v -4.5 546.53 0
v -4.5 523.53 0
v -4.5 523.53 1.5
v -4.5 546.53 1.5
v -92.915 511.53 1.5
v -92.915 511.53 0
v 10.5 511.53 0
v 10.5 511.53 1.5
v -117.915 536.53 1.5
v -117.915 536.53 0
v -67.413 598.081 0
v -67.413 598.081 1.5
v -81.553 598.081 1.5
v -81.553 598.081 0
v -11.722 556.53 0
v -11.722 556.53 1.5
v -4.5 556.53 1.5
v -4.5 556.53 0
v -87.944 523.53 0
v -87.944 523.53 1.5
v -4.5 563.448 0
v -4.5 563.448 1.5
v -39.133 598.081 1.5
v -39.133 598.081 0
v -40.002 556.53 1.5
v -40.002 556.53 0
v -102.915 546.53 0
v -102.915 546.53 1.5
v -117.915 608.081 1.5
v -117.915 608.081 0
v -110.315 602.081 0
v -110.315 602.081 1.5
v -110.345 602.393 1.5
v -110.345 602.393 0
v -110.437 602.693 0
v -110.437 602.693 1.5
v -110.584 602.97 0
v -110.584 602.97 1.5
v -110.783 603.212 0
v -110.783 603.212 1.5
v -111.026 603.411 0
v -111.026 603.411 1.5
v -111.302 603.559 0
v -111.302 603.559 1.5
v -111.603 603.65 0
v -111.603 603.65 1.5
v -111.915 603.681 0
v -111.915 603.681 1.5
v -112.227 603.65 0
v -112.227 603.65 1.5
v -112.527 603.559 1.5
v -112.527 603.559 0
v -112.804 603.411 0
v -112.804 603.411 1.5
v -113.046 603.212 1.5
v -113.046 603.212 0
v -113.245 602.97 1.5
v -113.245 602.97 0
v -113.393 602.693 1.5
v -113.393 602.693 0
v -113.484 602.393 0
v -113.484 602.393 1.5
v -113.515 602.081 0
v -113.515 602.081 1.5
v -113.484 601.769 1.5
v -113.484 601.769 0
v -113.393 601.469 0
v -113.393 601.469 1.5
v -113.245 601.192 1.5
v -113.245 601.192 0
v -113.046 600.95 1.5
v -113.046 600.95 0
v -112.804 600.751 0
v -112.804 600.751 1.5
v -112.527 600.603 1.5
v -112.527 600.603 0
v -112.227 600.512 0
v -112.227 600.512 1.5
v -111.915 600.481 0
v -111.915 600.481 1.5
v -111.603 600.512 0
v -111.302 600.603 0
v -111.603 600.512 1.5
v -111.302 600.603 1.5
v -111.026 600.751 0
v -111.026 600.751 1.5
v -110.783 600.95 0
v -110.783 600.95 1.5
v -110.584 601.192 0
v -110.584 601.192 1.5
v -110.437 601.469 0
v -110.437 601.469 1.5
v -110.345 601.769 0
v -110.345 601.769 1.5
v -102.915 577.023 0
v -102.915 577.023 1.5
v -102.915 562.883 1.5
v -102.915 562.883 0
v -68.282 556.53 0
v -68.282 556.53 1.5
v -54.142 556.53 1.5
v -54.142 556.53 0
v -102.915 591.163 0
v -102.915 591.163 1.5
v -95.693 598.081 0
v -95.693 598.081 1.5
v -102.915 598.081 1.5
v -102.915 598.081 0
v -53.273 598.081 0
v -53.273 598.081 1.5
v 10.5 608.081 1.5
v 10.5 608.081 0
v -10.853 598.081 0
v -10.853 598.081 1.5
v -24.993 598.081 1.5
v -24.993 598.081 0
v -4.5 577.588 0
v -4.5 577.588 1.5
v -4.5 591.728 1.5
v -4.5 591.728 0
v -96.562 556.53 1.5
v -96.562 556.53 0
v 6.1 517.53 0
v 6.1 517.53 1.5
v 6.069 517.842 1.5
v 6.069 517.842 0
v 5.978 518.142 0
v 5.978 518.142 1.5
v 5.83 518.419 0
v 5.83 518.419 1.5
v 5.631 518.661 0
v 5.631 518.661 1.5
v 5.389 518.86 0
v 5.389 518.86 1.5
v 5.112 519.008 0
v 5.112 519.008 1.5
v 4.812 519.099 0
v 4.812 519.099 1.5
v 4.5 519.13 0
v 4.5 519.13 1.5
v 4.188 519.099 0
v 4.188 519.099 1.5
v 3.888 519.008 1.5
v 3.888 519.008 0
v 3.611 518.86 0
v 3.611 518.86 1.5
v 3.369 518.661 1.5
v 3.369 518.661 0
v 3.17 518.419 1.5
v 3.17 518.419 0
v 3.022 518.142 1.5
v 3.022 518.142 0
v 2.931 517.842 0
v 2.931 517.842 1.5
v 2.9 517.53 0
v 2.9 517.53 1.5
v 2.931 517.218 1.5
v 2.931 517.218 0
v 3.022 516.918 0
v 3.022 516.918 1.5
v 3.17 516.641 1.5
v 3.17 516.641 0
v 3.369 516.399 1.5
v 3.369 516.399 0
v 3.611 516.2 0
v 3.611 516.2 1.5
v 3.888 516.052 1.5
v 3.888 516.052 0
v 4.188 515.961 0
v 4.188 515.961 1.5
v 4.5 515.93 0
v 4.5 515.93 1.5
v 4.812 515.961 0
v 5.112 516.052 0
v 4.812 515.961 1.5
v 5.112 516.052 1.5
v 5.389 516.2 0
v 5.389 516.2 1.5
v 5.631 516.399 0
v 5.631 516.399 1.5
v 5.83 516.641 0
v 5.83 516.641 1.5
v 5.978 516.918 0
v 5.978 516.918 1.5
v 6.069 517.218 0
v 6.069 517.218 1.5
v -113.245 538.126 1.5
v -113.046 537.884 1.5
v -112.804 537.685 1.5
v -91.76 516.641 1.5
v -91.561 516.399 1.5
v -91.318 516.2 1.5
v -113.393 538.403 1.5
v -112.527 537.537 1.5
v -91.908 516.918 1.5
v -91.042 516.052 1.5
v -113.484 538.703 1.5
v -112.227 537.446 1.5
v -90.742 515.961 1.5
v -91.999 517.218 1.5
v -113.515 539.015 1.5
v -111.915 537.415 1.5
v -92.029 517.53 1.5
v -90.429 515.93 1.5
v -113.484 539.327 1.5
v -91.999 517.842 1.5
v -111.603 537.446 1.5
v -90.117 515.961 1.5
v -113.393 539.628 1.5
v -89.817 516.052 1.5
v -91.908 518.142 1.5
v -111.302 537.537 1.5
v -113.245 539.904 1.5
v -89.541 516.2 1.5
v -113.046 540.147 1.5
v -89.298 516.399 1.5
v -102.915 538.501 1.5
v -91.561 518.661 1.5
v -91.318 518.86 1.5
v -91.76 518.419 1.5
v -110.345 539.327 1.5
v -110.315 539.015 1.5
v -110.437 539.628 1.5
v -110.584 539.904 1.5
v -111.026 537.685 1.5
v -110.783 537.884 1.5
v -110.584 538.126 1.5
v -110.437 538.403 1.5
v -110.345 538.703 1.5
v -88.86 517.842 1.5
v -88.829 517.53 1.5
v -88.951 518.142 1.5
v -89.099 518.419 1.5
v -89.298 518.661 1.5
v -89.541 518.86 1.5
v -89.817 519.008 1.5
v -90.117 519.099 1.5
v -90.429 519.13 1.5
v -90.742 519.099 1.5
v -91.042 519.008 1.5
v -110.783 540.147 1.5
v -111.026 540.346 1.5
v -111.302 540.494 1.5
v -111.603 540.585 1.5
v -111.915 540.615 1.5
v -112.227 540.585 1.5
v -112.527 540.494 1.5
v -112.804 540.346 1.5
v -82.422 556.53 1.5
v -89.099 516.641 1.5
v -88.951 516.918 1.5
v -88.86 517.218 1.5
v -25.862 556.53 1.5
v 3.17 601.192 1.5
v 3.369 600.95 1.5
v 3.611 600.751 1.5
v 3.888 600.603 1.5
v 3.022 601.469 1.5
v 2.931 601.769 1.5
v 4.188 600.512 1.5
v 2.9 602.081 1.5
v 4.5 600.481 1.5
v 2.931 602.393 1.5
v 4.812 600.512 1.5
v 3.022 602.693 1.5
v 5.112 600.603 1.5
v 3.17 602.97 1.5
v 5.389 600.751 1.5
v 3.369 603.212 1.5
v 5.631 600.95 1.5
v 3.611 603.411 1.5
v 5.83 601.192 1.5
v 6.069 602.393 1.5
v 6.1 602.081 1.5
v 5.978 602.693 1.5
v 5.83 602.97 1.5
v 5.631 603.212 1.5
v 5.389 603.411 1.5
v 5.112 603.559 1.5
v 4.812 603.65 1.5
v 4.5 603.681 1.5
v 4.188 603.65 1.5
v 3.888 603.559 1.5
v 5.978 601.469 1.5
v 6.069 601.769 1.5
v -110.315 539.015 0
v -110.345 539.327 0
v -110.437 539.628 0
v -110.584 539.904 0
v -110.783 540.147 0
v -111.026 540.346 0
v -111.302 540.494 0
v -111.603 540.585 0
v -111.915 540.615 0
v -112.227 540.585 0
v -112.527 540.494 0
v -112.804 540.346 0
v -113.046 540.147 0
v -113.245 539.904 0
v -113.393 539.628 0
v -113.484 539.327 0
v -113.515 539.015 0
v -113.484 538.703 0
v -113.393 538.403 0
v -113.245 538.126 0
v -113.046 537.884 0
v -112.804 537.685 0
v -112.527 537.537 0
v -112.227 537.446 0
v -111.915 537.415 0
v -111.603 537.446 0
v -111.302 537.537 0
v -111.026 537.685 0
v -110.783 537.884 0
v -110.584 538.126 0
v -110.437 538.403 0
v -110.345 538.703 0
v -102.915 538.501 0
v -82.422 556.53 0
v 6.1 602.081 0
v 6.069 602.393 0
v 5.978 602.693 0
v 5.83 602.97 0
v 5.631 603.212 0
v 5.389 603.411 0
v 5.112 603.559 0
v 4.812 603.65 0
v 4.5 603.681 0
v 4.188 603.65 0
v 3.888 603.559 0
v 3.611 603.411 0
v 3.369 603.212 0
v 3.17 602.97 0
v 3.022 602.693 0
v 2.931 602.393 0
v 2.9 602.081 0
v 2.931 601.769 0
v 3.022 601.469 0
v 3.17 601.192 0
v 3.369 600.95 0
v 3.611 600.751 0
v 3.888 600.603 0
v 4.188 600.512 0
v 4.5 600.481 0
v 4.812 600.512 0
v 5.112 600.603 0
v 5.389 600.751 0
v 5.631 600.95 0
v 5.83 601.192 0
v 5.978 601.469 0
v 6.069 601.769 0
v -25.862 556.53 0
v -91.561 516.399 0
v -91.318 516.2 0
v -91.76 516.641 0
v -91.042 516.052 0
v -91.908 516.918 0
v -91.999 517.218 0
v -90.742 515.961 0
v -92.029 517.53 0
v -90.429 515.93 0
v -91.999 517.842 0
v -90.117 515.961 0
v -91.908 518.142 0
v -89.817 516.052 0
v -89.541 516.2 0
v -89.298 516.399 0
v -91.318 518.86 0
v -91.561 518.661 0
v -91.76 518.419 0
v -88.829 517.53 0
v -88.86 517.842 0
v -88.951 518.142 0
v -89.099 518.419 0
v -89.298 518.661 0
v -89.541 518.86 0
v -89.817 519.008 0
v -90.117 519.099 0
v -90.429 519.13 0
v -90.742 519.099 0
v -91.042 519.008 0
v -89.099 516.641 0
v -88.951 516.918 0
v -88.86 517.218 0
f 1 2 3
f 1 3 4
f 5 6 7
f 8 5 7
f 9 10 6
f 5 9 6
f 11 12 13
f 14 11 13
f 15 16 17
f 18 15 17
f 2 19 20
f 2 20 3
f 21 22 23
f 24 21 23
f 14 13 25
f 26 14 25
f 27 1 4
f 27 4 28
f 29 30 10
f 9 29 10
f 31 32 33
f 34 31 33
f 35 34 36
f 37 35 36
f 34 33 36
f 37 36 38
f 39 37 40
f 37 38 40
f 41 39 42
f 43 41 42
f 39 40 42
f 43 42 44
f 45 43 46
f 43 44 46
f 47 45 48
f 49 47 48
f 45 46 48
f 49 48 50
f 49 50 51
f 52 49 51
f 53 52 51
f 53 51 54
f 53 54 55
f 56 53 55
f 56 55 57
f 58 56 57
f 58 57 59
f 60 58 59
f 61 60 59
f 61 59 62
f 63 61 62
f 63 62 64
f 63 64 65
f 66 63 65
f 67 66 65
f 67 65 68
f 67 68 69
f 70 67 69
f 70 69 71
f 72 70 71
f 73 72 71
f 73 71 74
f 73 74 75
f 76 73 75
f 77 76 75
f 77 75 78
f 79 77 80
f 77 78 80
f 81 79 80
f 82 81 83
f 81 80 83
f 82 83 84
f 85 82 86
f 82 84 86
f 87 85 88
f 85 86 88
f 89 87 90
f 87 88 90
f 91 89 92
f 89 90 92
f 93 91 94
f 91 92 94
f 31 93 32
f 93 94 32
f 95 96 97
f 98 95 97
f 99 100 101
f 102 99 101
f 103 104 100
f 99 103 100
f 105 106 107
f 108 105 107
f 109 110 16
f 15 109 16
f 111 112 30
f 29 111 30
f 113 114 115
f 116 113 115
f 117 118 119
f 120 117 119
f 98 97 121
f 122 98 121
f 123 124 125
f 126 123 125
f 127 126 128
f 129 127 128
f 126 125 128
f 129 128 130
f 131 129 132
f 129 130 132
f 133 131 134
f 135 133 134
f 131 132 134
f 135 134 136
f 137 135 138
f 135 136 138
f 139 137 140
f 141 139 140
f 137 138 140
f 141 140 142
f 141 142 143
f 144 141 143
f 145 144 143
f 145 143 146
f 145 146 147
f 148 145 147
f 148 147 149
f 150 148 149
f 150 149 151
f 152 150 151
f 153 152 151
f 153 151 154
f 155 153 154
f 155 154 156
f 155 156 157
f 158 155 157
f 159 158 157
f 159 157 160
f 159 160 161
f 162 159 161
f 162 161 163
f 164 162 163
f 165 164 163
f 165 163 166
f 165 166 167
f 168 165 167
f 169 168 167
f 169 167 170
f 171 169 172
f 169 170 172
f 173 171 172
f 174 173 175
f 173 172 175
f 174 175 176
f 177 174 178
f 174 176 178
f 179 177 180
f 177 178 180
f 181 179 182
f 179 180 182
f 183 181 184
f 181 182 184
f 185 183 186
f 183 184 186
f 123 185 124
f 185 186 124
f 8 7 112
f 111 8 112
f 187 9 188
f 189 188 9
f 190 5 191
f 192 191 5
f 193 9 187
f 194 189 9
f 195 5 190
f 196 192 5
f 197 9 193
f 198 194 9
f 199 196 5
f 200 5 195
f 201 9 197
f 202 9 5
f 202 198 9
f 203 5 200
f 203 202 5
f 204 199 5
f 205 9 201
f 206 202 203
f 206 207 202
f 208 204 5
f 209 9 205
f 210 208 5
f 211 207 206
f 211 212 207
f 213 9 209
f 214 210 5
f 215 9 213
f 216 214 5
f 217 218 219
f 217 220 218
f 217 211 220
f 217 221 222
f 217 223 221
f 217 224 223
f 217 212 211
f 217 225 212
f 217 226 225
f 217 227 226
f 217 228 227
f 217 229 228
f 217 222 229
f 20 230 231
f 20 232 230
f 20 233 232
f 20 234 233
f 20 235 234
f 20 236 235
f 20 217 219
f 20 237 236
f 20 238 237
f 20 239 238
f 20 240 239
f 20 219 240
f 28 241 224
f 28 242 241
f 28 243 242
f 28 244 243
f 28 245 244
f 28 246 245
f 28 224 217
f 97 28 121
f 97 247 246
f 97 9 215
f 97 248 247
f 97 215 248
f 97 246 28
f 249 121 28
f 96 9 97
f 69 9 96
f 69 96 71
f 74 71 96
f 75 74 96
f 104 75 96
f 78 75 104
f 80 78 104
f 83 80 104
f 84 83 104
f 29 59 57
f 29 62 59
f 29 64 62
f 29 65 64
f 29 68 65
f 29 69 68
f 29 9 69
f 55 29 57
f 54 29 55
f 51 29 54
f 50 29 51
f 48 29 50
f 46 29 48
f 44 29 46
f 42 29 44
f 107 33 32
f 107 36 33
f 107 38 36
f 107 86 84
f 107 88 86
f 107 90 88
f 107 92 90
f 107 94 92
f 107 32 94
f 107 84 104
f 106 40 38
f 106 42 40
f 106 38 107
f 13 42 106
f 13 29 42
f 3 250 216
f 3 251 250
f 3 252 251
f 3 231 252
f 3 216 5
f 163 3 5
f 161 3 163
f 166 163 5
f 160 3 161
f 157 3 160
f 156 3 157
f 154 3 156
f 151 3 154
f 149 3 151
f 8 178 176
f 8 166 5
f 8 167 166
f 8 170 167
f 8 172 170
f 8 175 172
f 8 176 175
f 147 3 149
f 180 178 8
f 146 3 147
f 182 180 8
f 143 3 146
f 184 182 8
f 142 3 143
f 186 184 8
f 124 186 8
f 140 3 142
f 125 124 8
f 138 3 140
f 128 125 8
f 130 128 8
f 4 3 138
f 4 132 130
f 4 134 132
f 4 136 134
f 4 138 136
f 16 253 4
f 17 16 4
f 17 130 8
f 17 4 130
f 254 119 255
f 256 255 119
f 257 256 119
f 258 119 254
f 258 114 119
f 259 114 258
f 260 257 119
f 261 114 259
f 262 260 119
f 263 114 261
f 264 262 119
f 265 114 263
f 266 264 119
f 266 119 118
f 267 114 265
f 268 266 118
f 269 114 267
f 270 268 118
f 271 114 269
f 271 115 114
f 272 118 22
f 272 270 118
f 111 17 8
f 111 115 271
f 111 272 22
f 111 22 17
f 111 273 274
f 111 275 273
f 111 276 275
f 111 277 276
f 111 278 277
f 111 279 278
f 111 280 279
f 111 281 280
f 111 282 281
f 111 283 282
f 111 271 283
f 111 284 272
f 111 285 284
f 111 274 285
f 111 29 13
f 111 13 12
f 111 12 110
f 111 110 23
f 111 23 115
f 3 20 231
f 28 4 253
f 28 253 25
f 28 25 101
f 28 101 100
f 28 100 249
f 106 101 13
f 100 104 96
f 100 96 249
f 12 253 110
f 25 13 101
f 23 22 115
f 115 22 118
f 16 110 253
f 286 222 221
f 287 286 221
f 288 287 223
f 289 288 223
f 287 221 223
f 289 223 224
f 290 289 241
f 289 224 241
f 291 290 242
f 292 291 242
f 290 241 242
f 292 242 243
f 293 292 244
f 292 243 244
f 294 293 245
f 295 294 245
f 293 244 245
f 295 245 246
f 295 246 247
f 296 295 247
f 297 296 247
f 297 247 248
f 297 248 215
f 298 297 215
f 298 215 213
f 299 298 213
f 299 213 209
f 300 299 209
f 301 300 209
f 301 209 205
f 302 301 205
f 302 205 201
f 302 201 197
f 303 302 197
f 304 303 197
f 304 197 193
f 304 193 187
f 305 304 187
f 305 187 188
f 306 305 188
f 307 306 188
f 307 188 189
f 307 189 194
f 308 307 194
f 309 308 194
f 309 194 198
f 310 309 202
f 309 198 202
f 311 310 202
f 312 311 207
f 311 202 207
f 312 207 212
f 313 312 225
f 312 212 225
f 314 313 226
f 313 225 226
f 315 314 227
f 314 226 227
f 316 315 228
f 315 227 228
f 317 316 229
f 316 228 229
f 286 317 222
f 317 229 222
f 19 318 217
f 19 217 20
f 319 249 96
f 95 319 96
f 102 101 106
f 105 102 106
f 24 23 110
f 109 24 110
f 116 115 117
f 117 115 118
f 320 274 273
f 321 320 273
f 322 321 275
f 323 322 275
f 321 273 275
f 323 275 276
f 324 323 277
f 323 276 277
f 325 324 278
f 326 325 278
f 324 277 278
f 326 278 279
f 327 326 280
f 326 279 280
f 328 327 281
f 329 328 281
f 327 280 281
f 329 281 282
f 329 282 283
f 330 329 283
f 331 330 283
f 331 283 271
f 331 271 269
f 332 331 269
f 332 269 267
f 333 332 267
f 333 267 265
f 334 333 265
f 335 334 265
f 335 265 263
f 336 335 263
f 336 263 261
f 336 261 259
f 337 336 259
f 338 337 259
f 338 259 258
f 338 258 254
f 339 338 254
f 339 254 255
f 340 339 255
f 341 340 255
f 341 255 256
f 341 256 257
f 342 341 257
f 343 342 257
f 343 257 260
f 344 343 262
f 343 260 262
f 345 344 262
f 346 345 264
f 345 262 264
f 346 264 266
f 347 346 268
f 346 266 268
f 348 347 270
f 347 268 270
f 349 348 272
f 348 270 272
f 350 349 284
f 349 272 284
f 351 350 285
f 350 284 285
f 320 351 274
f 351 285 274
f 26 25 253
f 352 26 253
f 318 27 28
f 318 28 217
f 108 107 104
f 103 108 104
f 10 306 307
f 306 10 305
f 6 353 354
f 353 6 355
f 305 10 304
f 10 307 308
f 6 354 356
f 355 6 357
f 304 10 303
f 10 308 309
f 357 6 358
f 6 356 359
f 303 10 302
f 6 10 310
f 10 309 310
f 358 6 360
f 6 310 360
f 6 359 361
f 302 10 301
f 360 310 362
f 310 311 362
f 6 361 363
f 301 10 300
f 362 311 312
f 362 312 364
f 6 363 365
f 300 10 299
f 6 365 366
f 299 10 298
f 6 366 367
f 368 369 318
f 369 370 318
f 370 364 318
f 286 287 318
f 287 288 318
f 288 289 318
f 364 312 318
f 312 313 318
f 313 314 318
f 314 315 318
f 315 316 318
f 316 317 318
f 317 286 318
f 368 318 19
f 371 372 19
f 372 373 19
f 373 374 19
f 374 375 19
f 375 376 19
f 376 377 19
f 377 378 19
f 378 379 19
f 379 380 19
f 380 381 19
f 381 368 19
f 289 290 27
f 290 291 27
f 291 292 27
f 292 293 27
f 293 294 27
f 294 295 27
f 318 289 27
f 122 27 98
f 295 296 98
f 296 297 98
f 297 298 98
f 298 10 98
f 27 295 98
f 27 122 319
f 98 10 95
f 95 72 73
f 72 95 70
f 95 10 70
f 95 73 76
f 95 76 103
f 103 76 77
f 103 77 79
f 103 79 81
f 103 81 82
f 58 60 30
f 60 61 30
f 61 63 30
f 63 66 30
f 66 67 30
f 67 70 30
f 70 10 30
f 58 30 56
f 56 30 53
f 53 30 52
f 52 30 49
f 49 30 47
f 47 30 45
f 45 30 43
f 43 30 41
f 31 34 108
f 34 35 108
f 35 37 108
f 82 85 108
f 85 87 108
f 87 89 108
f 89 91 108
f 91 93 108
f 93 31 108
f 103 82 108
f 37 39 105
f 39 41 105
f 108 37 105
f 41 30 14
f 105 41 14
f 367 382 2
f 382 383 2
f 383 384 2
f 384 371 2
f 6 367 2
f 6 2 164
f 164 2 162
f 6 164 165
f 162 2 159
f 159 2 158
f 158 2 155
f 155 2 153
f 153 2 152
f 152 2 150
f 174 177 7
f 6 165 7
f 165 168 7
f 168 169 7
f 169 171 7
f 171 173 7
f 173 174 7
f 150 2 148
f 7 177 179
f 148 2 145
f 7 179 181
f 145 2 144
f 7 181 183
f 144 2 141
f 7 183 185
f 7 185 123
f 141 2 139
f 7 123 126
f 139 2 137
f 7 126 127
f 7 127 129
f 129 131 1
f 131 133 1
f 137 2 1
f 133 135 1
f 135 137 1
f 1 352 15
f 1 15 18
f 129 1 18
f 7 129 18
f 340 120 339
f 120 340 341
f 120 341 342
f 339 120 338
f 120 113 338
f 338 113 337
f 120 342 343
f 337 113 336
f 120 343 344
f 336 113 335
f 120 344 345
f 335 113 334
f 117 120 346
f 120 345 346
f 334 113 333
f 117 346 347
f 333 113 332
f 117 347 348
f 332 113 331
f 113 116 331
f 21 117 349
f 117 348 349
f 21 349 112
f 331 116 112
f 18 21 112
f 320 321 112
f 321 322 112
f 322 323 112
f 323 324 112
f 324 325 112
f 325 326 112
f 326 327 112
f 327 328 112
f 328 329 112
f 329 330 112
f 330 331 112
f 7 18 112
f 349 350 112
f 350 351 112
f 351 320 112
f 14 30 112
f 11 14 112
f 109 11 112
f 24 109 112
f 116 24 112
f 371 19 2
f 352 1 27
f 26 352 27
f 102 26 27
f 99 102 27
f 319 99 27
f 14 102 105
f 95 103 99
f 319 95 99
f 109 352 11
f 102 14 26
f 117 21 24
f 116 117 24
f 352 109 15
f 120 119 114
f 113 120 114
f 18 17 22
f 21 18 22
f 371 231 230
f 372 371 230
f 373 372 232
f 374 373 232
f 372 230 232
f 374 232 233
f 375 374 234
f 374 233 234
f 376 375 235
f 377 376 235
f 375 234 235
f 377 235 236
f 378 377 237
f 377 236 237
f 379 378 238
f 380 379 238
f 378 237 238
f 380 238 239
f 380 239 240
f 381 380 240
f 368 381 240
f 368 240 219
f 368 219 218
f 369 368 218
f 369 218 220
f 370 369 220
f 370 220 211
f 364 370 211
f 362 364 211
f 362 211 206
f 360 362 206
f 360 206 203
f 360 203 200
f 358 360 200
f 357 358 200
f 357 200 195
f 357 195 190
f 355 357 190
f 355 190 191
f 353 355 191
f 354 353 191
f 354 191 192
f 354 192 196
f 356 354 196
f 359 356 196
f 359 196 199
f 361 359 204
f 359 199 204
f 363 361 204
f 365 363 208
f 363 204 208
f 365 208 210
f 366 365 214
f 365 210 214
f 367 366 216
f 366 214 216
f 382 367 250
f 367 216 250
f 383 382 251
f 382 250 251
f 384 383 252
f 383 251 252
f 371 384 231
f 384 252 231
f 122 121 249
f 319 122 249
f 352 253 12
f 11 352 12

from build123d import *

# Parameters (mm, degrees)
BOSS_EXTRUDE1_DEPTH = 1.5
SKETCH2_R           = 1.6
CUT_EXTRUDE1_DEPTH  = 3.5
CUT_EXTRUDE3_DEPTH  = 10


with BuildPart() as part:
    # Sketch1 → Boss-Extrude1 (new body)
    with BuildSketch(Plane.XY):
        Polygon((-117.914742868, 608.080871166), (-117.914742868, 536.530029297), (-92.914742868, 511.530029297), (10.5, 511.530029297), (10.5, 608.080871166), align=None)
        Polygon((-4.5, 523.530029297), (-4.5, 546.530029297), (-102.914742868, 546.530029297), (-102.914742868, 538.500592045), (-87.94418012, 523.530029297), align=None, mode=Mode.SUBTRACT)
    extrude(amount=BOSS_EXTRUDE1_DEPTH)

    # Sketch2 → Cut-Extrude1 (cut)
    with BuildSketch(Plane.XY.offset(1.5)):
        with Locations((-111.914742868, 539.015310671)):
            Circle(SKETCH2_R)
        with Locations((-90.429461494, 517.530029297)):
            Circle(SKETCH2_R)
        with Locations((-111.914742868, 602.080871166)):
            Circle(SKETCH2_R)
        with Locations((4.5, 602.080871166)):
            Circle(SKETCH2_R)
        with Locations((4.5, 517.530029297)):
            Circle(SKETCH2_R)
    extrude(amount=-CUT_EXTRUDE1_DEPTH, mode=Mode.SUBTRACT)

    # Sketch3 → Cut-Extrude3 (cut)
    with BuildSketch(Plane.XY.offset(1.5)):
        Polygon((-82.4219505, 556.530029297), (-102.914742868, 577.022821666), (-102.914742868, 562.882821666), (-96.5619505, 556.530029297), align=None)
        Polygon((-95.692792369, 598.080871166), (-102.914742868, 598.080871166), (-102.914742868, 591.162821666), (-68.2819505, 556.530029297), (-54.1419505, 556.530029297), align=None)
        Polygon((-67.412792369, 598.080871166), (-81.552792369, 598.080871166), (-40.0019505, 556.530029297), (-25.8619505, 556.530029297), align=None)
        Polygon((-39.132792369, 598.080871166), (-53.272792369, 598.080871166), (-11.7219505, 556.530029297), (-4.5, 556.530029297), (-4.5, 563.448078797), align=None)
        Polygon((-10.852792369, 598.080871166), (-24.992792369, 598.080871166), (-4.5, 577.588078797), (-4.5, 591.728078797), align=None)
    extrude(amount=-CUT_EXTRUDE3_DEPTH, mode=Mode.SUBTRACT)


solid = part.part
